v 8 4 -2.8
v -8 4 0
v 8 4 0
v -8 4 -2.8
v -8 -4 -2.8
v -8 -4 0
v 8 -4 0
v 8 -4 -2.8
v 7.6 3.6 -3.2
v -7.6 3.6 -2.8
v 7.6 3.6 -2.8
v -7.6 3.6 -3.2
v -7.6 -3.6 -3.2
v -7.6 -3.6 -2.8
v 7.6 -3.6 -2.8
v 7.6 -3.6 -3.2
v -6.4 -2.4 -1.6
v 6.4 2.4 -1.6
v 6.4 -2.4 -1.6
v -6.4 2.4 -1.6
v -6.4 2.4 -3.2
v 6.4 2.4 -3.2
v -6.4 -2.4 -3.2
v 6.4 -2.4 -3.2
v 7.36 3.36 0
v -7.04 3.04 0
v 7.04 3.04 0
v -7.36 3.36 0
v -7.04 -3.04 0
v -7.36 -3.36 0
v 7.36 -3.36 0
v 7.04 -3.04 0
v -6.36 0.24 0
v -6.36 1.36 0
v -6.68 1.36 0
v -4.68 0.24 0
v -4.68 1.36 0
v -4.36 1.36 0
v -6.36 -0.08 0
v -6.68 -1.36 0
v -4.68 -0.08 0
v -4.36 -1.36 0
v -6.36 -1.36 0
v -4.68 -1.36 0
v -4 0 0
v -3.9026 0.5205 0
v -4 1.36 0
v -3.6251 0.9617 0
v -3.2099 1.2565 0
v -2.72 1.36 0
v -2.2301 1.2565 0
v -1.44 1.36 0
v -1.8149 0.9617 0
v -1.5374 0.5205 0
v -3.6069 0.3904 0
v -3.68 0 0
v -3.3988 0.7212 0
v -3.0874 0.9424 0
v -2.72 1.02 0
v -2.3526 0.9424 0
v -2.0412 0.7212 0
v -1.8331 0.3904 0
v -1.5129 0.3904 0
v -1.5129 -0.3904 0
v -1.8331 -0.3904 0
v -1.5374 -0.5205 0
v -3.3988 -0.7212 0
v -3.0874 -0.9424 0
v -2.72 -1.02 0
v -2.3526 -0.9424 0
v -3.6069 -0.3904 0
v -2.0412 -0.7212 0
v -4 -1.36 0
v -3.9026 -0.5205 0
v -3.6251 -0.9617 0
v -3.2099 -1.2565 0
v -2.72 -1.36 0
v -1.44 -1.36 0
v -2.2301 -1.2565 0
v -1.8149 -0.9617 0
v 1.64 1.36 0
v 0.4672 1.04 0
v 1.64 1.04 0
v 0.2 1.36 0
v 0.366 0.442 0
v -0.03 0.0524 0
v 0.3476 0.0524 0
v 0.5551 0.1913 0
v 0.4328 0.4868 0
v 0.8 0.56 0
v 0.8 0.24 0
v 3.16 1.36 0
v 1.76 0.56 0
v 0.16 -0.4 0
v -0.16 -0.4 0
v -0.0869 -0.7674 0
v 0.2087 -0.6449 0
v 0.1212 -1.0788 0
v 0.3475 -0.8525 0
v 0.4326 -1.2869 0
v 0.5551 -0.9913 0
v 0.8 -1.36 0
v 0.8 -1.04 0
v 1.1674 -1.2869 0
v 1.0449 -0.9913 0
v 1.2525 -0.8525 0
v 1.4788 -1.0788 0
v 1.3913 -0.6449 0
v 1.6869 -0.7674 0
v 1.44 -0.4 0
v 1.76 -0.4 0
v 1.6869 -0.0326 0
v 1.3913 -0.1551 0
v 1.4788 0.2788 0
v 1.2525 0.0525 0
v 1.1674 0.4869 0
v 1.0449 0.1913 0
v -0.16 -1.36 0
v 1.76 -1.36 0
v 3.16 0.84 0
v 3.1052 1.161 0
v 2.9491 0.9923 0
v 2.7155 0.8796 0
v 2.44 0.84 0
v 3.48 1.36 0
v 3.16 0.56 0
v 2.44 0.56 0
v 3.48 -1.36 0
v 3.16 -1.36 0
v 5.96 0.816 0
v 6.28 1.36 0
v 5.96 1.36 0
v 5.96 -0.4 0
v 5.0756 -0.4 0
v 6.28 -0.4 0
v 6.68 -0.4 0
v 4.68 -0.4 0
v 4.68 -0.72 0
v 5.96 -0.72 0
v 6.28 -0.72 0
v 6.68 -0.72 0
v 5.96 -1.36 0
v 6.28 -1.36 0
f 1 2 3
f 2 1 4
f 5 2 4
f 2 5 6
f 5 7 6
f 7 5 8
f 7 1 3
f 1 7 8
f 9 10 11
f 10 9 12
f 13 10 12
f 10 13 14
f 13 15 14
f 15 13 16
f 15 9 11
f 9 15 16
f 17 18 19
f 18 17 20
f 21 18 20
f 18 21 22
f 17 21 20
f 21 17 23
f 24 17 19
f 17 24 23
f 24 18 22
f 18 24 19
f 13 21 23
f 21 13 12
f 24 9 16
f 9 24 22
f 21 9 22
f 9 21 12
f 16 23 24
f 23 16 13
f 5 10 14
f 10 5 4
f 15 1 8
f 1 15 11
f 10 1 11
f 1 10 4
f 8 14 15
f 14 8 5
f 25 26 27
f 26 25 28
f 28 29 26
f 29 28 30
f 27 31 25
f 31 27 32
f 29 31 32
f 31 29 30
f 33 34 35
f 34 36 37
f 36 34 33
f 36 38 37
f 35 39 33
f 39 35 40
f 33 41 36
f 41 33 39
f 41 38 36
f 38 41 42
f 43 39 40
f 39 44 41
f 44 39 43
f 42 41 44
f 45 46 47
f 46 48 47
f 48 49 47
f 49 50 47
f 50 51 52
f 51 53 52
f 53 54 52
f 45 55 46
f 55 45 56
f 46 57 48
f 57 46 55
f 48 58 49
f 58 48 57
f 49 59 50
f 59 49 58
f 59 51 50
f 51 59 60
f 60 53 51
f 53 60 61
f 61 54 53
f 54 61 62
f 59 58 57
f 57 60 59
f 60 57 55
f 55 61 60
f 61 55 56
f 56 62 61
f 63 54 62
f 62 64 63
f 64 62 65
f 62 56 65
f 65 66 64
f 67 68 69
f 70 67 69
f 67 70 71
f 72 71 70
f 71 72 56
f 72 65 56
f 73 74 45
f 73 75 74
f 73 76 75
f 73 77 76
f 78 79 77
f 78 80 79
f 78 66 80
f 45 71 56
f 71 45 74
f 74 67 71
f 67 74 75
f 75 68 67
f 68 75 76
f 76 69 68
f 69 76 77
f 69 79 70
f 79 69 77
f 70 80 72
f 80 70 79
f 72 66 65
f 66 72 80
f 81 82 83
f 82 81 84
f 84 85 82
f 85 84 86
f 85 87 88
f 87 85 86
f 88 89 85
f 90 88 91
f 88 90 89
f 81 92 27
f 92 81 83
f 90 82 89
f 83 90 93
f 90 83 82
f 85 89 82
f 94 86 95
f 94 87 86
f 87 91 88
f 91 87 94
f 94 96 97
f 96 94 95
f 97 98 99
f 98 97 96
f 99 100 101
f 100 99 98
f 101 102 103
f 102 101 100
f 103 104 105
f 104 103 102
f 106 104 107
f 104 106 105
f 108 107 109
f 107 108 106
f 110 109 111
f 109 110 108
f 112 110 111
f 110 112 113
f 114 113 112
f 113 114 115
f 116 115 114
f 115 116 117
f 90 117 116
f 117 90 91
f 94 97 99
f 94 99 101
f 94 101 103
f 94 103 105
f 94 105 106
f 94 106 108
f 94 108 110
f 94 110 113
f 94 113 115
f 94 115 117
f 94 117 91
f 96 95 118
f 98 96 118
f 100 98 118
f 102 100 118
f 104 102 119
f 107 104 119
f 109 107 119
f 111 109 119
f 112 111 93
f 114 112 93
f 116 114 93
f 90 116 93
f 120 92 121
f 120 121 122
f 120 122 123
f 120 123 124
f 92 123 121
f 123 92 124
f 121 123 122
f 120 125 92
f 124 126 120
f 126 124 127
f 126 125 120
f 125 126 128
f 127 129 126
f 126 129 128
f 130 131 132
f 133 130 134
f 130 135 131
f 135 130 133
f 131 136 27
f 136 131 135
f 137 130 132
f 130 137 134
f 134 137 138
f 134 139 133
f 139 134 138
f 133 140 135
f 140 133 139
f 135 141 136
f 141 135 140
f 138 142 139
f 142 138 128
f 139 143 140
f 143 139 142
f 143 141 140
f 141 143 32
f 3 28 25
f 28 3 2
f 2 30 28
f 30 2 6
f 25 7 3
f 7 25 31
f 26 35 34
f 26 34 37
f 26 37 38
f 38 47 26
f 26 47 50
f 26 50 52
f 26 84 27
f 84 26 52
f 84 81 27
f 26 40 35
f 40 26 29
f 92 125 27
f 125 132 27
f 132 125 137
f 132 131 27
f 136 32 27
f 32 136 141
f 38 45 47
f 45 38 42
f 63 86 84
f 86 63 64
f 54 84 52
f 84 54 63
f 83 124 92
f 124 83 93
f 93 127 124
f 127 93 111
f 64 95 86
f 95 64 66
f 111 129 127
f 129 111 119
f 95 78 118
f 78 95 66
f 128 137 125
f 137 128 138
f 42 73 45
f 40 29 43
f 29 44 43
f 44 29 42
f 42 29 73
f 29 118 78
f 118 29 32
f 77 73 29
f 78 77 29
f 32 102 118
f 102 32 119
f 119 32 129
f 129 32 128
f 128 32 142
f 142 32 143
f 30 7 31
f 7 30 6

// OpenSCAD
// file: ../p/box5.scad
use <../lib.scad>
function ldraw_lib__box5() = [
// 0 Box with 5 Faces and All Edges
// 0 Name: box5.dat
// 0 Author: James Jessiman
// 0 !LDRAW_ORG Primitive UPDATE 2012-01
// 0 !LICENSE Licensed under CC BY 2.0 and CC BY 4.0 : see CAreadme.txt
// 
// 0 BFC CERTIFY CCW
  [0,"BFC","CERTIFY"],
  [0,"BFC","CCW"],
// 
// 0 !HISTORY 2002-04-03 [sbliss] Modified for BFC compliance
// 0 !HISTORY 2002-04-25 [PTadmin] Official Update 2002-02
// 0 !HISTORY 2007-06-24 [PTadmin] Header formatted for Contributor Agreement
// 0 !HISTORY 2008-07-01 [PTadmin] Official Update 2008-01
// 0 !HISTORY 2012-02-16 [Philo] Changed to CCW
// 0 !HISTORY 2012-03-30 [PTadmin] Official Update 2012-01
// 
// 
// 2 24 1 1 1 -1 1 1
  [2,24,1,1,1,-1,1,1],
// 2 24 -1 1 1 -1 1 -1
  [2,24,-1,1,1,-1,1,-1],
// 2 24 -1 1 -1 1 1 -1
  [2,24,-1,1,-1,1,1,-1],
// 2 24 1 1 -1 1 1 1
  [2,24,1,1,-1,1,1,1],
// 2 24 1 0 1 -1 0 1
  [2,24,1,0,1,-1,0,1],
// 2 24 -1 0 1 -1 0 -1
  [2,24,-1,0,1,-1,0,-1],
// 2 24 -1 0 -1 1 0 -1
  [2,24,-1,0,-1,1,0,-1],
// 2 24 1 0 -1 1 0 1
  [2,24,1,0,-1,1,0,1],
// 2 24 1 0 1 1 1 1
  [2,24,1,0,1,1,1,1],
// 2 24 -1 0 1 -1 1 1
  [2,24,-1,0,1,-1,1,1],
// 2 24 1 0 -1 1 1 -1
  [2,24,1,0,-1,1,1,-1],
// 2 24 -1 0 -1 -1 1 -1
  [2,24,-1,0,-1,-1,1,-1],
// 4 16 -1 1 1 1 1 1 1 1 -1 -1 1 -1
  [4,16,-1,1,1,1,1,1,1,1,-1,-1,1,-1],
// 4 16 -1 1 1 -1 0 1 1 0 1 1 1 1
  [4,16,-1,1,1,-1,0,1,1,0,1,1,1,1],
// 4 16 -1 1 -1 -1 0 -1 -1 0 1 -1 1 1
  [4,16,-1,1,-1,-1,0,-1,-1,0,1,-1,1,1],
// 4 16 1 1 -1 1 0 -1 -1 0 -1 -1 1 -1
  [4,16,1,1,-1,1,0,-1,-1,0,-1,-1,1,-1],
// 4 16 1 1 1 1 0 1 1 0 -1 1 1 -1
  [4,16,1,1,1,1,0,1,1,0,-1,1,1,-1],
];
makepoly(ldraw_lib__box5(), line=0.2);
// file: ../p/box4.scad
use <../lib.scad>
function ldraw_lib__box4() = [
// 0 Box with 4 Faces (2 Parallel Pairs) and All Edges
// 0 Name: box4.dat
// 0 Author: James Jessiman
// 0 !LDRAW_ORG Primitive UPDATE 2012-01
// 0 !LICENSE Licensed under CC BY 2.0 and CC BY 4.0 : see CAreadme.txt
// 
// 0 BFC CERTIFY CCW
  [0,"BFC","CERTIFY"],
  [0,"BFC","CCW"],
// 
// 0 !HISTORY 2002-04-03 [sbliss] Modified for BFC compliance
// 0 !HISTORY 2002-04-25 [PTadmin] Official Update 2002-02
// 0 !HISTORY 2007-06-24 [PTadmin] Header formatted for Contributor Agreement
// 0 !HISTORY 2008-07-01 [PTadmin] Official Update 2008-01
// 0 !HISTORY 2012-02-16 [Philo] Changed to CCW
// 0 !HISTORY 2012-03-30 [PTadmin] Official Update 2012-01
// 
// 
// 2 24 1 1 1 -1 1 1
  [2,24,1,1,1,-1,1,1],
// 2 24 -1 1 1 -1 1 -1
  [2,24,-1,1,1,-1,1,-1],
// 2 24 -1 1 -1 1 1 -1
  [2,24,-1,1,-1,1,1,-1],
// 2 24 1 1 -1 1 1 1
  [2,24,1,1,-1,1,1,1],
// 2 24 1 0 1 -1 0 1
  [2,24,1,0,1,-1,0,1],
// 2 24 -1 0 1 -1 0 -1
  [2,24,-1,0,1,-1,0,-1],
// 2 24 -1 0 -1 1 0 -1
  [2,24,-1,0,-1,1,0,-1],
// 2 24 1 0 -1 1 0 1
  [2,24,1,0,-1,1,0,1],
// 2 24 1 0 1 1 1 1
  [2,24,1,0,1,1,1,1],
// 2 24 -1 0 1 -1 1 1
  [2,24,-1,0,1,-1,1,1],
// 2 24 1 0 -1 1 1 -1
  [2,24,1,0,-1,1,1,-1],
// 2 24 -1 0 -1 -1 1 -1
  [2,24,-1,0,-1,-1,1,-1],
// 4 16 -1 1 1 -1 0 1 1 0 1 1 1 1
  [4,16,-1,1,1,-1,0,1,1,0,1,1,1,1],
// 4 16 -1 1 -1 -1 0 -1 -1 0 1 -1 1 1
  [4,16,-1,1,-1,-1,0,-1,-1,0,1,-1,1,1],
// 4 16 1 1 -1 1 0 -1 -1 0 -1 -1 1 -1
  [4,16,1,1,-1,1,0,-1,-1,0,-1,-1,1,-1],
// 4 16 1 1 1 1 0 1 1 0 -1 1 1 -1
  [4,16,1,1,1,1,0,1,1,0,-1,1,1,-1],
];
makepoly(ldraw_lib__box4(), line=0.2);
// file: s/3069bs01.scad
use <../../lib.scad>
use <../../p/box4.scad>
use <../../p/box5.scad>
function ldraw_lib__s__3069bs01() = [
// 0 ~Tile  1 x  2 with Groove without Top Face
// 0 Name: s\3069bs01.dat
// 0 Author: Santeri Piippo [arezey]
// 0 !LDRAW_ORG Subpart UPDATE 2010-02
// 0 !LICENSE Licensed under CC BY 2.0 and CC BY 4.0 : see CAreadme.txt
// 
// 0 BFC CERTIFY CCW
  [0,"BFC","CERTIFY"],
  [0,"BFC","CCW"],
// 
// 0 !HISTORY 2010-07-05 [PTadmin] Official Update 2010-02
// 
// 
// 1 16 0 0 0 20 0 0 0 7 0 0 0 10 box4.dat
  [1,16,0,0,0,20,0,0,0,7,0,0,0,10, ldraw_lib__box4()],
// 1 16 0 7 0 19 0 0 0 1 0 0 0 9 box4.dat
  [1,16,0,7,0,19,0,0,0,1,0,0,0,9, ldraw_lib__box4()],
// 0 BFC INVERTNEXT
  [0,"BFC","INVERTNEXT"],
// 1 16 0 8 0 16 0 0 0 -4 0 0 0 6 box5.dat
  [1,16,0,8,0,16,0,0,0,-4,0,0,0,6, ldraw_lib__box5()],
// 4 16 -19 8 9 -16 8 6 -16 8 -6 -19 8 -9
  [4,16,-19,8,9,-16,8,6,-16,8,-6,-19,8,-9],
// 4 16 19 8 -9 16 8 -6 16 8 6 19 8 9
  [4,16,19,8,-9,16,8,-6,16,8,6,19,8,9],
// 4 16 19 8 9 16 8 6 -16 8 6 -19 8 9
  [4,16,19,8,9,16,8,6,-16,8,6,-19,8,9],
// 4 16 -19 8 -9 -16 8 -6 16 8 -6 19 8 -9
  [4,16,-19,8,-9,-16,8,-6,16,8,-6,19,8,-9],
// 4 16 -20 7 10 -19 7 9 -19 7 -9 -20 7 -10
  [4,16,-20,7,10,-19,7,9,-19,7,-9,-20,7,-10],
// 4 16 20 7 -10 19 7 -9 19 7 9 20 7 10
  [4,16,20,7,-10,19,7,-9,19,7,9,20,7,10],
// 4 16 20 7 10 19 7 9 -19 7 9 -20 7 10
  [4,16,20,7,10,19,7,9,-19,7,9,-20,7,10],
// 4 16 -20 7 -10 -19 7 -9 19 7 -9 20 7 -10
  [4,16,-20,7,-10,-19,7,-9,19,7,-9,20,7,-10],
// 0 //
];
makepoly(ldraw_lib__s__3069bs01(), line=0.2);
// file: ../p/7-16rin3.scad
use <../lib.scad>
function ldraw_lib__7_16rin3() = [
// 0 Ring  3 x 0.4375
// 0 Name: 7-16rin3.dat
// 0 Author: Alex Taylor [anathema]
// 0 !LDRAW_ORG Primitive UPDATE 2010-01
// 0 !LICENSE Licensed under CC BY 2.0 and CC BY 4.0 : see CAreadme.txt
// 
// 0 BFC CERTIFY CCW
  [0,"BFC","CERTIFY"],
  [0,"BFC","CCW"],
// 
// 0 !HISTORY 2010-04-05 [PTadmin] Official Update 2010-01
// 
// 
// 4 16 3 0 0 4 0 0 3.6956 0 1.5308 2.7717 0 1.1481
  [4,16,3,0,0,4,0,0,3.6956,0,1.5308,2.7717,0,1.1481],
// 4 16 2.7717 0 1.1481 3.6956 0 1.5308 2.8284 0 2.8284 2.1213 0 2.1213
  [4,16,2.7717,0,1.1481,3.6956,0,1.5308,2.8284,0,2.8284,2.1213,0,2.1213],
// 4 16 2.1213 0 2.1213 2.8284 0 2.8284 1.5308 0 3.6956 1.1481 0 2.7717
  [4,16,2.1213,0,2.1213,2.8284,0,2.8284,1.5308,0,3.6956,1.1481,0,2.7717],
// 4 16 1.1481 0 2.7717 1.5308 0 3.6956 0 0 4 0 0 3
  [4,16,1.1481,0,2.7717,1.5308,0,3.6956,0,0,4,0,0,3],
// 4 16 0 0 3 0 0 4 -1.5308 0 3.6956 -1.1481 0 2.7717
  [4,16,0,0,3,0,0,4,-1.5308,0,3.6956,-1.1481,0,2.7717],
// 4 16 -1.1481 0 2.7717 -1.5308 0 3.6956 -2.8284 0 2.8284 -2.1213 0 2.1213
  [4,16,-1.1481,0,2.7717,-1.5308,0,3.6956,-2.8284,0,2.8284,-2.1213,0,2.1213],
// 4 16 -2.1213 0 2.1213 -2.8284 0 2.8284 -3.6956 0 1.5308 -2.7717 0 1.1481
  [4,16,-2.1213,0,2.1213,-2.8284,0,2.8284,-3.6956,0,1.5308,-2.7717,0,1.1481],
// 0
];
makepoly(ldraw_lib__7_16rin3(), line=0.2);
// file: ../p/7-16ndis.scad
use <../lib.scad>
function ldraw_lib__7_16ndis() = [
// 0 Disc Negative 0.4375
// 0 Name: 7-16ndis.dat
// 0 Author: Alex Taylor [anathema]
// 0 !LDRAW_ORG Primitive UPDATE 2010-01
// 0 !LICENSE Licensed under CC BY 2.0 and CC BY 4.0 : see CAreadme.txt
// 
// 0 BFC CERTIFY CCW
  [0,"BFC","CERTIFY"],
  [0,"BFC","CCW"],
// 
// 0 !HISTORY 2010-04-05 [PTadmin] Official Update 2010-01
// 
// 
// 3 16 1 0 1 0.9239 0 0.3827 1 0 0
  [3,16,1,0,1,0.9239,0,0.3827,1,0,0],
// 3 16 1 0 1 0.7071 0 0.7071 0.9239 0 0.3827
  [3,16,1,0,1,0.7071,0,0.7071,0.9239,0,0.3827],
// 3 16 1 0 1 0.3827 0 0.9239 0.7071 0 0.7071
  [3,16,1,0,1,0.3827,0,0.9239,0.7071,0,0.7071],
// 3 16 1 0 1 0 0 1 0.3827 0 0.9239
  [3,16,1,0,1,0,0,1,0.3827,0,0.9239],
// 3 16 -1 0 1 -0.3827 0 0.9239 0 0 1
  [3,16,-1,0,1,-0.3827,0,0.9239,0,0,1],
// 3 16 -1 0 1 -0.7071 0 0.7071 -0.3827 0 0.9239
  [3,16,-1,0,1,-0.7071,0,0.7071,-0.3827,0,0.9239],
// 3 16 -1 0 1 -0.9239 0 0.3827 -0.7071 0 0.7071
  [3,16,-1,0,1,-0.9239,0,0.3827,-0.7071,0,0.7071],
// 0
];
makepoly(ldraw_lib__7_16ndis(), line=0.2);
// file: ../p/7-16chrd.scad
use <../lib.scad>
function ldraw_lib__7_16chrd() = [
// 0 Chord 0.4375
// 0 Name: 7-16chrd.dat
// 0 Author: Guy Vivan [guyvivan]
// 0 !LDRAW_ORG Primitive UPDATE 2009-03
// 0 !LICENSE Licensed under CC BY 2.0 and CC BY 4.0 : see CAreadme.txt
// 
// 0 BFC CERTIFY CCW
  [0,"BFC","CERTIFY"],
  [0,"BFC","CCW"],
// 
// 0 !HISTORY 2009-12-29 [PTadmin] Official Update 2009-03
// 
// 
// 3 16 0.7071 0 0.7071 0.3827 0 0.9239 0 0 1
  [3,16,0.7071,0,0.7071,0.3827,0,0.9239,0,0,1],
// 4 16 0.7071 0 0.7071 0 0 1 -0.3827 0 0.9239 0.9239 0 0.3827
  [4,16,0.7071,0,0.7071,0,0,1,-0.3827,0,0.9239,0.9239,0,0.3827],
// 4 16 0.9239 0 0.3827 -0.3827 0 0.9239 -0.7071 0 0.7071 1 0 0
  [4,16,0.9239,0,0.3827,-0.3827,0,0.9239,-0.7071,0,0.7071,1,0,0],
// 3 16 -0.7071 0 0.7071 -0.9239 0 0.3827 1 0 0
  [3,16,-0.7071,0,0.7071,-0.9239,0,0.3827,1,0,0],
// 0
];
makepoly(ldraw_lib__7_16chrd(), line=0.2);
// file: ../p/3-4ring2.scad
use <../lib.scad>
function ldraw_lib__3_4ring2() = [
// 0 Ring  2 x 0.75
// 0 Name: 3-4ring2.dat
// 0 Author: Mark Kennedy [mkennedy]
// 0 !LDRAW_ORG Primitive UPDATE 2012-01
// 0 !LICENSE Licensed under CC BY 2.0 and CC BY 4.0 : see CAreadme.txt
// 
// 0 BFC CERTIFY CCW
  [0,"BFC","CERTIFY"],
  [0,"BFC","CCW"],
// 
// 0 !HISTORY 2009-05-02 [PTadmin] Official Update 2009-01
// 0 !HISTORY 2012-02-16 [Philo] Changed to CCW
// 0 !HISTORY 2012-03-30 [PTadmin] Official Update 2012-01
// 
// 
// 4 16 3 0 0 2.7717 0 1.1481 1.8478 0 0.7654 2 0 0
  [4,16,3,0,0,2.7717,0,1.1481,1.8478,0,0.7654,2,0,0],
// 4 16 2.7717 0 1.1481 2.1213 0 2.1213 1.4142 0 1.4142 1.8478 0 0.7654
  [4,16,2.7717,0,1.1481,2.1213,0,2.1213,1.4142,0,1.4142,1.8478,0,0.7654],
// 4 16 2.1213 0 2.1213 1.1481 0 2.7717 0.7654 0 1.8478 1.4142 0 1.4142
  [4,16,2.1213,0,2.1213,1.1481,0,2.7717,0.7654,0,1.8478,1.4142,0,1.4142],
// 4 16 1.1481 0 2.7717 0 0 3 0 0 2 0.7654 0 1.8478
  [4,16,1.1481,0,2.7717,0,0,3,0,0,2,0.7654,0,1.8478],
// 4 16 0 0 3 -1.1481 0 2.7717 -0.7654 0 1.8478 0 0 2
  [4,16,0,0,3,-1.1481,0,2.7717,-0.7654,0,1.8478,0,0,2],
// 4 16 -1.1481 0 2.7717 -2.1213 0 2.1213 -1.4142 0 1.4142 -0.7654 0 1.8478
  [4,16,-1.1481,0,2.7717,-2.1213,0,2.1213,-1.4142,0,1.4142,-0.7654,0,1.8478],
// 4 16 -2.1213 0 2.1213 -2.7717 0 1.1481 -1.8478 0 0.7654 -1.4142 0 1.4142
  [4,16,-2.1213,0,2.1213,-2.7717,0,1.1481,-1.8478,0,0.7654,-1.4142,0,1.4142],
// 4 16 -2.7717 0 1.1481 -3 0 0 -2 0 0 -1.8478 0 0.7654
  [4,16,-2.7717,0,1.1481,-3,0,0,-2,0,0,-1.8478,0,0.7654],
// 4 16 -3 0 0 -2.7717 0 -1.1481 -1.8478 0 -0.7654 -2 0 0
  [4,16,-3,0,0,-2.7717,0,-1.1481,-1.8478,0,-0.7654,-2,0,0],
// 4 16 -2.7717 0 -1.1481 -2.1213 0 -2.1213 -1.4142 0 -1.4142 -1.8478 0 -0.7654
  [4,16,-2.7717,0,-1.1481,-2.1213,0,-2.1213,-1.4142,0,-1.4142,-1.8478,0,-0.7654],
// 4 16 -2.1213 0 -2.1213 -1.1481 0 -2.7717 -0.7654 0 -1.8478 -1.4142 0 -1.4142
  [4,16,-2.1213,0,-2.1213,-1.1481,0,-2.7717,-0.7654,0,-1.8478,-1.4142,0,-1.4142],
// 4 16 -1.1481 0 -2.7717 0 0 -3 0 0 -2 -0.7654 0 -1.8478
  [4,16,-1.1481,0,-2.7717,0,0,-3,0,0,-2,-0.7654,0,-1.8478],
];
makepoly(ldraw_lib__3_4ring2(), line=0.2);
// file: ../p/3-4ndis.scad
use <../lib.scad>
function ldraw_lib__3_4ndis() = [
// 0 Disc Negative 0.75
// 0 Name: 3-4ndis.dat
// 0 Author: James Jessiman
// 0 !LDRAW_ORG Primitive UPDATE 2012-01
// 0 !LICENSE Licensed under CC BY 2.0 and CC BY 4.0 : see CAreadme.txt
// 
// 0 BFC CERTIFY CCW
  [0,"BFC","CERTIFY"],
  [0,"BFC","CCW"],
// 
// 0 !HISTORY 2002-03-23 [sbliss] Added BFC statement; compacted code
// 0 !HISTORY 2002-04-25 [PTadmin] Official Update 2002-02
// 0 !HISTORY 2007-06-24 [PTadmin] Header formatted for Contributor Agreement
// 0 !HISTORY 2008-07-01 [PTadmin] Official Update 2008-01
// 0 !HISTORY 2012-02-16 [Philo] Changed to CCW
// 0 !HISTORY 2012-03-30 [PTadmin] Official Update 2012-01
// 
// 
// 3 16 0.9239 0 0.3827 1 0 0 1 0 1
  [3,16,0.9239,0,0.3827,1,0,0,1,0,1],
// 3 16 0.7071 0 0.7071 0.9239 0 0.3827 1 0 1
  [3,16,0.7071,0,0.7071,0.9239,0,0.3827,1,0,1],
// 3 16 0.3827 0 0.9239 0.7071 0 0.7071 1 0 1
  [3,16,0.3827,0,0.9239,0.7071,0,0.7071,1,0,1],
// 3 16 0 0 1 0.3827 0 0.9239 1 0 1
  [3,16,0,0,1,0.3827,0,0.9239,1,0,1],
// 3 16 -0.3827 0 0.9239 0 0 1 -1 0 1
  [3,16,-0.3827,0,0.9239,0,0,1,-1,0,1],
// 3 16 -0.7071 0 0.7071 -0.3827 0 0.9239 -1 0 1
  [3,16,-0.7071,0,0.7071,-0.3827,0,0.9239,-1,0,1],
// 3 16 -0.9239 0 0.3827 -0.7071 0 0.7071 -1 0 1
  [3,16,-0.9239,0,0.3827,-0.7071,0,0.7071,-1,0,1],
// 3 16 -1 0 0 -0.9239 0 0.3827 -1 0 1
  [3,16,-1,0,0,-0.9239,0,0.3827,-1,0,1],
// 3 16 -0.9239 0 -0.3827 -1 0 0 -1 0 -1
  [3,16,-0.9239,0,-0.3827,-1,0,0,-1,0,-1],
// 3 16 -0.7071 0 -0.7071 -0.9239 0 -0.3827 -1 0 -1
  [3,16,-0.7071,0,-0.7071,-0.9239,0,-0.3827,-1,0,-1],
// 3 16 -0.3827 0 -0.9239 -0.7071 0 -0.7071 -1 0 -1
  [3,16,-0.3827,0,-0.9239,-0.7071,0,-0.7071,-1,0,-1],
// 3 16 0 0 -1 -0.3827 0 -0.9239 -1 0 -1
  [3,16,0,0,-1,-0.3827,0,-0.9239,-1,0,-1],
];
makepoly(ldraw_lib__3_4ndis(), line=0.2);
// file: ../p/3-4chrd.scad
use <../lib.scad>
function ldraw_lib__3_4chrd() = [
// 0 Chord 0.75
// 0 Name: 3-4chrd.dat
// 0 Author: Philippe Hurbain [Philo]
// 0 !LDRAW_ORG Primitive UPDATE 2015-02
// 0 !LICENSE Licensed under CC BY 2.0 and CC BY 4.0 : see CAreadme.txt
// 
// 0 BFC CERTIFY CCW
  [0,"BFC","CERTIFY"],
  [0,"BFC","CCW"],
// 
// 0 !HISTORY 2015-12-30 [PTadmin] Official Update 2015-02
// 
// 
// 3 16 1 0 0 0.9239 0 0.3827 0.7071 0 0.7071
  [3,16,1,0,0,0.9239,0,0.3827,0.7071,0,0.7071],
// 3 16 1 0 0 0.7071 0 0.7071 0.3827 0 0.9239
  [3,16,1,0,0,0.7071,0,0.7071,0.3827,0,0.9239],
// 3 16 1 0 0 0.3827 0 0.9239 0 0 1
  [3,16,1,0,0,0.3827,0,0.9239,0,0,1],
// 3 16 1 0 0 0 0 1 -0.3827 0 0.9239
  [3,16,1,0,0,0,0,1,-0.3827,0,0.9239],
// 3 16 1 0 0 -0.3827 0 0.9239 -0.7071 0 0.7071
  [3,16,1,0,0,-0.3827,0,0.9239,-0.7071,0,0.7071],
// 3 16 1 0 0 -0.7071 0 0.7071 -0.9239 0 0.3827
  [3,16,1,0,0,-0.7071,0,0.7071,-0.9239,0,0.3827],
// 3 16 1 0 0 -0.9239 0 0.3827 -1 0 0
  [3,16,1,0,0,-0.9239,0,0.3827,-1,0,0],
// 3 16 1 0 0 -1 0 0 -0.9239 0 -0.3827
  [3,16,1,0,0,-1,0,0,-0.9239,0,-0.3827],
// 3 16 1 0 0 -0.9239 0 -0.3827 -0.7071 0 -0.7071
  [3,16,1,0,0,-0.9239,0,-0.3827,-0.7071,0,-0.7071],
// 3 16 1 0 0 -0.7071 0 -0.7071 -0.3827 0 -0.9239
  [3,16,1,0,0,-0.7071,0,-0.7071,-0.3827,0,-0.9239],
// 3 16 1 0 0 -0.3827 0 -0.9239 0 0 -1
  [3,16,1,0,0,-0.3827,0,-0.9239,0,0,-1],
// 0 // Build by Primitive Generator 2
];
makepoly(ldraw_lib__3_4chrd(), line=0.2);
// file: ../p/1-4ndis.scad
use <../lib.scad>
function ldraw_lib__1_4ndis() = [
// 0 Disc Negative 0.25
// 0 Name: 1-4ndis.dat
// 0 Author: James Jessiman
// 0 !LDRAW_ORG Primitive UPDATE 2012-01
// 0 !LICENSE Licensed under CC BY 2.0 and CC BY 4.0 : see CAreadme.txt
// 
// 0 BFC CERTIFY CCW
  [0,"BFC","CERTIFY"],
  [0,"BFC","CCW"],
// 
// 0 !HISTORY 2002-03-23 [sbliss] Added BFC Statement
// 0 !HISTORY 2002-04-25 [PTadmin] Official Update 2002-02
// 0 !HISTORY 2007-06-22 [PTadmin] Header formatted for Contributor Agreement
// 0 !HISTORY 2008-07-01 [PTadmin] Official Update 2008-01
// 0 !HISTORY 2012-02-16 [Philo] Changed to CCW
// 0 !HISTORY 2012-03-30 [PTadmin] Official Update 2012-01
// 
// 
// 3 16 0.9239 0 0.3827 1 0 0 1 0 1
  [3,16,0.9239,0,0.3827,1,0,0,1,0,1],
// 3 16 0.7071 0 0.7071 0.9239 0 0.3827 1 0 1
  [3,16,0.7071,0,0.7071,0.9239,0,0.3827,1,0,1],
// 3 16 0.3827 0 0.9239 0.7071 0 0.7071 1 0 1
  [3,16,0.3827,0,0.9239,0.7071,0,0.7071,1,0,1],
// 3 16 0 0 1 0.3827 0 0.9239 1 0 1
  [3,16,0,0,1,0.3827,0,0.9239,1,0,1],
];
makepoly(ldraw_lib__1_4ndis(), line=0.2);
// file: ../p/1-4chrd.scad
use <../lib.scad>
function ldraw_lib__1_4chrd() = [
// 0 Chord 0.25
// 0 Name: 1-4chrd.dat
// 0 Author: Tony Hafner [hafhead]
// 0 !LDRAW_ORG Primitive UPDATE 2012-02
// 0 !LICENSE Licensed under CC BY 2.0 and CC BY 4.0 : see CAreadme.txt
// 
// 0 BFC CERTIFY CCW
  [0,"BFC","CERTIFY"],
  [0,"BFC","CCW"],
// 
// 0 !HISTORY 2004-04-22 [PTadmin] Official Update 2004-02
// 0 !HISTORY 2007-10-09 [PTadmin] Header formatted for Contributor Agreement
// 0 !HISTORY 2008-07-01 [PTadmin] Official Update 2008-01
// 0 !HISTORY 2012-08-02 [MMR1988] Re-creation with PrimGen2 and Rectifier
// 0 !HISTORY 2012-08-09 [PTadmin] Official Update 2012-02
// 
// 
// 4 16 0.9239 0 0.3827 0.3827 0 0.9239 0 0 1 1 0 0
  [4,16,0.9239,0,0.3827,0.3827,0,0.9239,0,0,1,1,0,0],
// 3 16 0.7071 0 0.7071 0.3827 0 0.9239 0.9239 0 0.3827
  [3,16,0.7071,0,0.7071,0.3827,0,0.9239,0.9239,0,0.3827],
];
makepoly(ldraw_lib__1_4chrd(), line=0.2);
// main file
use <../lib.scad>
use <../p/1-4chrd.scad>
use <../p/1-4ndis.scad>
use <../p/3-4chrd.scad>
use <../p/3-4ndis.scad>
use <../p/3-4ring2.scad>
use <../p/7-16chrd.scad>
use <../p/7-16ndis.scad>
use <../p/7-16rin3.scad>
use <s/3069bs01.scad>
function ldraw_lib__3069bpa1() = [
// 0 Tile  1 x  2 with White "HC514" Pattern
// 0 Name: 3069bpa1.dat
// 0 Author: Marek Idec [Maras]
// 0 !LDRAW_ORG Part UPDATE 2017-01
// 0 !LICENSE Licensed under CC BY 2.0 and CC BY 4.0 : see CAreadme.txt
// 
// 0 BFC CERTIFY CCW
  [0,"BFC","CERTIFY"],
  [0,"BFC","CCW"],
// 
// 0 !KEYWORDS Adventurers, Car, number-plate
// 
// 0 !HISTORY 2002-11-30 [PTadmin] Official Update 2002-05
// 0 !HISTORY 2007-06-13 [PTadmin] Header formatted for Contributor Agreement
// 0 !HISTORY 2008-07-01 [PTadmin] Official Update 2008-01
// 0 !HISTORY 2009-08-13 [anathema] BFC'd
// 0 !HISTORY 2010-12-31 [PTadmin] Official Update 2010-03
// 0 !HISTORY 2017-07-20 [Sirio] Corrected T-Junctions
// 0 !HISTORY 2017-12-30 [PTadmin] Official Update 2017-01
// 
// 
// 1 16 0 0 0 1 0 0 0 1 0 0 0 1 s\3069bs01.dat
  [1,16,0,0,0,1,0,0,0,1,0,0,0,1, ldraw_lib__s__3069bs01()],
// 0 // Pattern
// 0 // Frame
// 4 15 -18.4 0 8.4 -17.6 0 7.6 17.6 0 7.6 18.4 0 8.4
  [4,15,-18.4,0,8.4,-17.6,0,7.6,17.6,0,7.6,18.4,0,8.4],
// 4 15 -18.4 0 -8.4 -17.6 0 -7.6 -17.6 0 7.6 -18.4 0 8.4
  [4,15,-18.4,0,-8.4,-17.6,0,-7.6,-17.6,0,7.6,-18.4,0,8.4],
// 4 15 17.6 0 -7.6 18.4 0 -8.4 18.4 0 8.4 17.6 0 7.6
  [4,15,17.6,0,-7.6,18.4,0,-8.4,18.4,0,8.4,17.6,0,7.6],
// 4 15 -17.6 0 -7.6 -18.4 0 -8.4 18.4 0 -8.4 17.6 0 -7.6
  [4,15,-17.6,0,-7.6,-18.4,0,-8.4,18.4,0,-8.4,17.6,0,-7.6],
// 0 // Figures
// 0 // Letter H
// 3 15 -15.9 0 0.6 -15.9 0 3.4 -16.7 0 3.4
  [3,15,-15.9,0,0.6,-15.9,0,3.4,-16.7,0,3.4],
// 4 16 -15.9 0 0.6 -11.7 0 0.6 -11.7 0 3.4 -15.9 0 3.4
  [4,16,-15.9,0,0.6,-11.7,0,0.6,-11.7,0,3.4,-15.9,0,3.4],
// 3 15 -11.7 0 0.6 -10.9 0 3.4 -11.7 0 3.4
  [3,15,-11.7,0,0.6,-10.9,0,3.4,-11.7,0,3.4],
// 4 15 -15.9 0 0.6 -16.7 0 3.4 -16.7 0 -3.4 -15.9 0 -0.2
  [4,15,-15.9,0,0.6,-16.7,0,3.4,-16.7,0,-3.4,-15.9,0,-0.2],
// 4 15 -15.9 0 0.6 -15.9 0 -0.2 -11.7 0 -0.2 -11.7 0 0.6
  [4,15,-15.9,0,0.6,-15.9,0,-0.2,-11.7,0,-0.2,-11.7,0,0.6],
// 4 15 -11.7 0 0.6 -11.7 0 -0.2 -10.9 0 -3.4 -10.9 0 3.4
  [4,15,-11.7,0,0.6,-11.7,0,-0.2,-10.9,0,-3.4,-10.9,0,3.4],
// 3 15 -15.9 0 -3.4 -15.9 0 -0.2 -16.7 0 -3.4
  [3,15,-15.9,0,-3.4,-15.9,0,-0.2,-16.7,0,-3.4],
// 4 16 -15.9 0 -3.4 -11.7 0 -3.4 -11.7 0 -0.2 -15.9 0 -0.2
  [4,16,-15.9,0,-3.4,-11.7,0,-3.4,-11.7,0,-0.2,-15.9,0,-0.2],
// 3 15 -10.9 0 -3.4 -11.7 0 -0.2 -11.7 0 -3.4
  [3,15,-10.9,0,-3.4,-11.7,0,-0.2,-11.7,0,-3.4],
// 0 // Letter C
// 1 16 -6.8 0 0 -3.2 0 0 0 1 0 0 0 3.4 7-16ndis.dat
  [1,16,-6.8,0,0,-3.2,0,0,0,1,0,0,0,3.4, ldraw_lib__7_16ndis()],
// 1 15 -6.8 0 0 -.8 0 0 0 1 0 0 0 .85 7-16rin3.dat
  [1,15,-6.8,0,0,-.8,0,0,0,1,0,0,0,.85, ldraw_lib__7_16rin3()],
// 1 16 -6.8 0 0 -2.4 0 0 0 1 0 0 0 2.55 7-16chrd.dat
  [1,16,-6.8,0,0,-2.4,0,0,0,1,0,0,0,2.55, ldraw_lib__7_16chrd()],
// 3 15 -3.782359 0 .975885 -3.84352 0 1.30118 -4.58264 0 .975885
  [3,15,-3.782359,0,.975885,-3.84352,0,1.30118,-4.58264,0,.975885],
// 4 16 -3.782359 0 .975885 -4.58264 0 .975885 -4.58264 0 -.975885 -3.782359 0 -.975885
  [4,16,-3.782359,0,.975885,-4.58264,0,.975885,-4.58264,0,-.975885,-3.782359,0,-.975885],
// 3 16 -4.58264 0 .975885 -9.2 0 0 -4.58264 0 -.975885
  [3,16,-4.58264,0,.975885,-9.2,0,0,-4.58264,0,-.975885],
// 3 15 -4.58264 0 -.975885 -3.84352 0 -1.30118 -3.782359 0 -.975885
  [3,15,-4.58264,0,-.975885,-3.84352,0,-1.30118,-3.782359,0,-.975885],
// 1 16 -6.8 0 0 -2.4 0 0 0 1 0 0 0 -2.55 7-16chrd.dat
  [1,16,-6.8,0,0,-2.4,0,0,0,1,0,0,0,-2.55, ldraw_lib__7_16chrd()],
// 1 16 -6.8 0 0 -3.2 0 0 0 1 0 0 0 -3.4 7-16ndis.dat
  [1,16,-6.8,0,0,-3.2,0,0,0,1,0,0,0,-3.4, ldraw_lib__7_16ndis()],
// 1 15 -6.8 0 0 -0.8 0 0 0 1 0 0 0 -0.85 7-16rin3.dat
  [1,15,-6.8,0,0,-0.8,0,0,0,1,0,0,0,-0.85, ldraw_lib__7_16rin3()],
// 0 // Digit 5
// 4 15 .5 0 3.4 1.168 0 2.6 4.1 0 2.6 4.1 0 3.4
  [4,15,.5,0,3.4,1.168,0,2.6,4.1,0,2.6,4.1,0,3.4],
// 4 15 .5 0 3.4 -.075 0 .131 .915 0 1.105 1.168 0 2.6
  [4,15,.5,0,3.4,-.075,0,.131,.915,0,1.105,1.168,0,2.6],
// 4 15 1.3877 0 .4782 .915 0 1.105 -.075 0 .131 .869 0 .131
  [4,15,1.3877,0,.4782,.915,0,1.105,-.075,0,.131,.869,0,.131],
// 3 15 1.3877 0 0.4782 1.082 0 1.217 0.915 0 1.105
  [3,15,1.3877,0,0.4782,1.082,0,1.217,0.915,0,1.105],
// 4 15 1.3877 0 0.4782 2 0 0.6 2 0 1.4 1.082 0 1.217
  [4,15,1.3877,0,0.4782,2,0,0.6,2,0,1.4,1.082,0,1.217],
// 4 16 17.6 0 7.6 4.1 0 3.4 4.1 0 2.6 7.9 0 3.4
  [4,16,17.6,0,7.6,4.1,0,3.4,4.1,0,2.6,7.9,0,3.4],
// 3 16 2 0 1.4 1.168 0 2.6 1.082 0 1.217
  [3,16,2,0,1.4,1.168,0,2.6,1.082,0,1.217],
// 4 16 2 0 1.4 4.4 0 1.4 4.1 0 2.6 1.168 0 2.6
  [4,16,2,0,1.4,4.4,0,1.4,4.1,0,2.6,1.168,0,2.6],
// 3 16 0.915 0 1.105 1.082 0 1.217 1.168 0 2.6
  [3,16,0.915,0,1.105,1.082,0,1.217,1.168,0,2.6],
// 3 16 .4 0 -1 -.075 0 .131 -.4 0 -1
  [3,16,.4,0,-1,-.075,0,.131,-.4,0,-1],
// 3 16 .4 0 -1 .869 0 .131 -.075 0 .131
  [3,16,.4,0,-1,.869,0,.131,-.075,0,.131],
// 4 16 1.3877 0 .4782 .869 0 .131 .4 0 -1 2 0 .6
  [4,16,1.3877,0,.4782,.869,0,.131,.4,0,-1,2,0,.6],
// 1 15 2 0 -1 -0.8 0 0 0 1 0 0 0 -0.8 3-4ring2.dat
  [1,15,2,0,-1,-0.8,0,0,0,1,0,0,0,-0.8, ldraw_lib__3_4ring2()],
// 1 16 2 0 -1 -1.6 0 0 0 1 0 0 0 -1.6 3-4chrd.dat
  [1,16,2,0,-1,-1.6,0,0,0,1,0,0,0,-1.6, ldraw_lib__3_4chrd()],
// 1 16 2 0 -1 -2.4 0 0 0 1 0 0 0 -2.4 3-4ndis.dat
  [1,16,2,0,-1,-2.4,0,0,0,1,0,0,0,-2.4, ldraw_lib__3_4ndis()],
// 0 // Digit 1
// 1 15 6.1 0 3.4 1.8 0 0 0 1 0 0 0 -1.3 1-4ndis.dat
  [1,15,6.1,0,3.4,1.8,0,0,0,1,0,0,0,-1.3, ldraw_lib__1_4ndis()],
// 1 16 6.1 0 3.4 1.8 0 0 0 1 0 0 0 -1.3 1-4chrd.dat
  [1,16,6.1,0,3.4,1.8,0,0,0,1,0,0,0,-1.3, ldraw_lib__1_4chrd()],
// 3 15 7.9 0 2.1 8.7 0 3.4 7.9 0 3.4
  [3,15,7.9,0,2.1,8.7,0,3.4,7.9,0,3.4],
// 4 15 7.9 0 2.1 6.1 0 2.1 6.1 0 1.4 7.9 0 1.4
  [4,15,7.9,0,2.1,6.1,0,2.1,6.1,0,1.4,7.9,0,1.4],
// 4 15 7.9 0 2.1 7.9 0 1.4 8.7 0 -3.4 8.7 0 3.4
  [4,15,7.9,0,2.1,7.9,0,1.4,8.7,0,-3.4,8.7,0,3.4],
// 3 16 6.1 0 1.4 7.9 0 -3.4 7.9 0 1.4
  [3,16,6.1,0,1.4,7.9,0,-3.4,7.9,0,1.4],
// 3 15 7.9 0 1.4 7.9 0 -3.4 8.7 0 -3.4
  [3,15,7.9,0,1.4,7.9,0,-3.4,8.7,0,-3.4],
// 0 // Digit 4
// 3 15 14.9 0 2.04 15.7 0 3.4 14.9 0 3.4
  [3,15,14.9,0,2.04,15.7,0,3.4,14.9,0,3.4],
// 3 16 14.9 0 -1 14.9 0 2.04 12.689 0 -1
  [3,16,14.9,0,-1,14.9,0,2.04,12.689,0,-1],
// 4 15 14.9 0 2.04 14.9 0 -1 15.7 0 -1 15.7 0 3.4
  [4,15,14.9,0,2.04,14.9,0,-1,15.7,0,-1,15.7,0,3.4],
// 4 16 15.7 0 -1 16.7 0 -1 17.6 0 7.6 15.7 0 3.4
  [4,16,15.7,0,-1,16.7,0,-1,17.6,0,7.6,15.7,0,3.4],
// 4 15 12.689 0 -1 14.9 0 2.04 14.9 0 3.4 11.7 0 -1
  [4,15,12.689,0,-1,14.9,0,2.04,14.9,0,3.4,11.7,0,-1],
// 3 15 12.689 0 -1 11.7 0 -1 11.7 0 -1.8
  [3,15,12.689,0,-1,11.7,0,-1,11.7,0,-1.8],
// 4 15 12.689 0 -1 11.7 0 -1.8 14.9 0 -1.8 14.9 0 -1
  [4,15,12.689,0,-1,11.7,0,-1.8,14.9,0,-1.8,14.9,0,-1],
// 4 15 14.9 0 -1 14.9 0 -1.8 15.7 0 -1.8 15.7 0 -1
  [4,15,14.9,0,-1,14.9,0,-1.8,15.7,0,-1.8,15.7,0,-1],
// 4 15 15.7 0 -1 15.7 0 -1.8 16.7 0 -1.8 16.7 0 -1
  [4,15,15.7,0,-1,15.7,0,-1.8,16.7,0,-1.8,16.7,0,-1],
// 4 16 8.7 0 -3.4 14.9 0 -3.4 14.9 0 -1.8 11.7 0 -1.8
  [4,16,8.7,0,-3.4,14.9,0,-3.4,14.9,0,-1.8,11.7,0,-1.8],
// 4 15 14.9 0 -1.8 14.9 0 -3.4 15.7 0 -3.4 15.7 0 -1.8
  [4,15,14.9,0,-1.8,14.9,0,-3.4,15.7,0,-3.4,15.7,0,-1.8],
// 4 16 15.7 0 -3.4 17.6 0 -7.6 16.7 0 -1.8 15.7 0 -1.8
  [4,16,15.7,0,-3.4,17.6,0,-7.6,16.7,0,-1.8,15.7,0,-1.8],
// 0 // Background
// 4 16 -18.4 0 8.4 18.4 0 8.4 20 0 10 -20 0 10
  [4,16,-18.4,0,8.4,18.4,0,8.4,20,0,10,-20,0,10],
// 4 16 -18.4 0 8.4 -20 0 10 -20 0 -10 -18.4 0 -8.4
  [4,16,-18.4,0,8.4,-20,0,10,-20,0,-10,-18.4,0,-8.4],
// 4 16 18.4 0 8.4 18.4 0 -8.4 20 0 -10 20 0 10
  [4,16,18.4,0,8.4,18.4,0,-8.4,20,0,-10,20,0,10],
// 3 16 -17.6 0 7.6 -16.7 0 3.4 -15.9 0 3.4
  [3,16,-17.6,0,7.6,-16.7,0,3.4,-15.9,0,3.4],
// 3 16 -17.6 0 7.6 -15.9 0 3.4 -11.7 0 3.4
  [3,16,-17.6,0,7.6,-15.9,0,3.4,-11.7,0,3.4],
// 3 16 -17.6 0 7.6 -11.7 0 3.4 -10.9 0 3.4
  [3,16,-17.6,0,7.6,-11.7,0,3.4,-10.9,0,3.4],
// 3 16 -10.9 0 3.4 -10 0 3.4 -17.6 0 7.6
  [3,16,-10.9,0,3.4,-10,0,3.4,-17.6,0,7.6],
// 3 16 -17.6 0 7.6 -10 0 3.4 -6.8 0 3.4
  [3,16,-17.6,0,7.6,-10,0,3.4,-6.8,0,3.4],
// 3 16 -17.6 0 7.6 -6.8 0 3.4 -3.6 0 3.4
  [3,16,-17.6,0,7.6,-6.8,0,3.4,-3.6,0,3.4],
// 4 16 -17.6 0 7.6 -3.6 0 3.4 .5 0 3.4 17.6 0 7.6
  [4,16,-17.6,0,7.6,-3.6,0,3.4,.5,0,3.4,17.6,0,7.6],
// 3 16 .5 0 3.4 4.1 0 3.4 17.6 0 7.6
  [3,16,.5,0,3.4,4.1,0,3.4,17.6,0,7.6],
// 4 16 -17.6 0 7.6 -17.6 0 -7.6 -16.7 0 -3.4 -16.7 0 3.4
  [4,16,-17.6,0,7.6,-17.6,0,-7.6,-16.7,0,-3.4,-16.7,0,3.4],
// 3 16 7.9 0 3.4 8.7 0 3.4 17.6 0 7.6
  [3,16,7.9,0,3.4,8.7,0,3.4,17.6,0,7.6],
// 4 16 11.7 0 -1 14.9 0 3.4 17.6 0 7.6 8.7 0 3.4
  [4,16,11.7,0,-1,14.9,0,3.4,17.6,0,7.6,8.7,0,3.4],
// 3 16 14.9 0 3.4 15.7 0 3.4 17.6 0 7.6
  [3,16,14.9,0,3.4,15.7,0,3.4,17.6,0,7.6],
// 4 16 17.6 0 7.6 16.7 0 -1 16.7 0 -1.8 17.6 0 -7.6
  [4,16,17.6,0,7.6,16.7,0,-1,16.7,0,-1.8,17.6,0,-7.6],
// 4 16 -10 0 0 -10 0 3.4 -10.9 0 3.4 -10.9 0 -3.4
  [4,16,-10,0,0,-10,0,3.4,-10.9,0,3.4,-10.9,0,-3.4],
// 4 16 -3.782359 0 .97588 -3.782359 0 -.975885 -.075 0 .131 .5 0 3.4
  [4,16,-3.782359,0,.97588,-3.782359,0,-.975885,-.075,0,.131,.5,0,3.4],
// 4 16 -3.782359 0 .97588 .5 0 3.4 -3.6 0 3.4 -3.84352 0 1.30118
  [4,16,-3.782359,0,.97588,.5,0,3.4,-3.6,0,3.4,-3.84352,0,1.30118],
// 4 16 4.4 0 1.4 6.1 0 2.1 7.9 0 3.4 4.1 0 2.6
  [4,16,4.4,0,1.4,6.1,0,2.1,7.9,0,3.4,4.1,0,2.6],
// 4 16 6.1 0 2.1 4.4 0 1.4 4.4 0 -1 6.1 0 1.4
  [4,16,6.1,0,2.1,4.4,0,1.4,4.4,0,-1,6.1,0,1.4],
// 4 16 -3.84352 0 -1.30118 -.4 0 -1 -.075 0 .131 -3.782359 0 -.975885
  [4,16,-3.84352,0,-1.30118,-.4,0,-1,-.075,0,.131,-3.782359,0,-.975885],
// 4 16 6.1 0 1.4 4.4 0 -1 4.4 0 -3.4 7.9 0 -3.4
  [4,16,6.1,0,1.4,4.4,0,-1,4.4,0,-3.4,7.9,0,-3.4],
// 4 16 -3.6 0 -3.4 -.4 0 -3.4 -.4 0 -1 -3.84352 0 -1.30118
  [4,16,-3.6,0,-3.4,-.4,0,-3.4,-.4,0,-1,-3.84352,0,-1.30118],
// 4 16 8.7 0 3.4 8.7 0 -3.4 11.7 0 -1.8 11.7 0 -1
  [4,16,8.7,0,3.4,8.7,0,-3.4,11.7,0,-1.8,11.7,0,-1],
// 3 16 -10.9 0 -3.4 -10 0 -3.4 -10 0 0
  [3,16,-10.9,0,-3.4,-10,0,-3.4,-10,0,0],
// 3 16 -16.7 0 -3.4 -17.6 0 -7.6 -15.9 0 -3.4
  [3,16,-16.7,0,-3.4,-17.6,0,-7.6,-15.9,0,-3.4],
// 3 16 -17.6 0 -7.6 -11.7 0 -3.4 -15.9 0 -3.4
  [3,16,-17.6,0,-7.6,-11.7,0,-3.4,-15.9,0,-3.4],
// 3 16 -11.7 0 -3.4 -17.6 0 -7.6 -10.9 0 -3.4
  [3,16,-11.7,0,-3.4,-17.6,0,-7.6,-10.9,0,-3.4],
// 3 16 -10.9 0 -3.4 -17.6 0 -7.6 -10 0 -3.4
  [3,16,-10.9,0,-3.4,-17.6,0,-7.6,-10,0,-3.4],
// 4 16 -.4 0 -3.4 -3.6 0 -3.4 -17.6 0 -7.6 17.6 0 -7.6
  [4,16,-.4,0,-3.4,-3.6,0,-3.4,-17.6,0,-7.6,17.6,0,-7.6],
// 3 16 -6.8 0 -3.4 -10 0 -3.4 -17.6 0 -7.6
  [3,16,-6.8,0,-3.4,-10,0,-3.4,-17.6,0,-7.6],
// 3 16 -3.6 0 -3.4 -6.8 0 -3.4 -17.6 0 -7.6
  [3,16,-3.6,0,-3.4,-6.8,0,-3.4,-17.6,0,-7.6],
// 3 16 17.6 0 -7.6 2 0 -3.4 -.4 0 -3.4
  [3,16,17.6,0,-7.6,2,0,-3.4,-.4,0,-3.4],
// 3 16 2 0 -3.4 17.6 0 -7.6 4.4 0 -3.4
  [3,16,2,0,-3.4,17.6,0,-7.6,4.4,0,-3.4],
// 3 16 4.4 0 -3.4 17.6 0 -7.6 7.9 0 -3.4
  [3,16,4.4,0,-3.4,17.6,0,-7.6,7.9,0,-3.4],
// 3 16 7.9 0 -3.4 17.6 0 -7.6 8.7 0 -3.4
  [3,16,7.9,0,-3.4,17.6,0,-7.6,8.7,0,-3.4],
// 3 16 8.7 0 -3.4 17.6 0 -7.6 14.9 0 -3.4
  [3,16,8.7,0,-3.4,17.6,0,-7.6,14.9,0,-3.4],
// 3 16 14.9 0 -3.4 17.6 0 -7.6 15.7 0 -3.4
  [3,16,14.9,0,-3.4,17.6,0,-7.6,15.7,0,-3.4],
// 4 16 -18.4 0 -8.4 -20 0 -10 20 0 -10 18.4 0 -8.4
  [4,16,-18.4,0,-8.4,-20,0,-10,20,0,-10,18.4,0,-8.4],
];
makepoly(ldraw_lib__3069bpa1(), line=0.2);
